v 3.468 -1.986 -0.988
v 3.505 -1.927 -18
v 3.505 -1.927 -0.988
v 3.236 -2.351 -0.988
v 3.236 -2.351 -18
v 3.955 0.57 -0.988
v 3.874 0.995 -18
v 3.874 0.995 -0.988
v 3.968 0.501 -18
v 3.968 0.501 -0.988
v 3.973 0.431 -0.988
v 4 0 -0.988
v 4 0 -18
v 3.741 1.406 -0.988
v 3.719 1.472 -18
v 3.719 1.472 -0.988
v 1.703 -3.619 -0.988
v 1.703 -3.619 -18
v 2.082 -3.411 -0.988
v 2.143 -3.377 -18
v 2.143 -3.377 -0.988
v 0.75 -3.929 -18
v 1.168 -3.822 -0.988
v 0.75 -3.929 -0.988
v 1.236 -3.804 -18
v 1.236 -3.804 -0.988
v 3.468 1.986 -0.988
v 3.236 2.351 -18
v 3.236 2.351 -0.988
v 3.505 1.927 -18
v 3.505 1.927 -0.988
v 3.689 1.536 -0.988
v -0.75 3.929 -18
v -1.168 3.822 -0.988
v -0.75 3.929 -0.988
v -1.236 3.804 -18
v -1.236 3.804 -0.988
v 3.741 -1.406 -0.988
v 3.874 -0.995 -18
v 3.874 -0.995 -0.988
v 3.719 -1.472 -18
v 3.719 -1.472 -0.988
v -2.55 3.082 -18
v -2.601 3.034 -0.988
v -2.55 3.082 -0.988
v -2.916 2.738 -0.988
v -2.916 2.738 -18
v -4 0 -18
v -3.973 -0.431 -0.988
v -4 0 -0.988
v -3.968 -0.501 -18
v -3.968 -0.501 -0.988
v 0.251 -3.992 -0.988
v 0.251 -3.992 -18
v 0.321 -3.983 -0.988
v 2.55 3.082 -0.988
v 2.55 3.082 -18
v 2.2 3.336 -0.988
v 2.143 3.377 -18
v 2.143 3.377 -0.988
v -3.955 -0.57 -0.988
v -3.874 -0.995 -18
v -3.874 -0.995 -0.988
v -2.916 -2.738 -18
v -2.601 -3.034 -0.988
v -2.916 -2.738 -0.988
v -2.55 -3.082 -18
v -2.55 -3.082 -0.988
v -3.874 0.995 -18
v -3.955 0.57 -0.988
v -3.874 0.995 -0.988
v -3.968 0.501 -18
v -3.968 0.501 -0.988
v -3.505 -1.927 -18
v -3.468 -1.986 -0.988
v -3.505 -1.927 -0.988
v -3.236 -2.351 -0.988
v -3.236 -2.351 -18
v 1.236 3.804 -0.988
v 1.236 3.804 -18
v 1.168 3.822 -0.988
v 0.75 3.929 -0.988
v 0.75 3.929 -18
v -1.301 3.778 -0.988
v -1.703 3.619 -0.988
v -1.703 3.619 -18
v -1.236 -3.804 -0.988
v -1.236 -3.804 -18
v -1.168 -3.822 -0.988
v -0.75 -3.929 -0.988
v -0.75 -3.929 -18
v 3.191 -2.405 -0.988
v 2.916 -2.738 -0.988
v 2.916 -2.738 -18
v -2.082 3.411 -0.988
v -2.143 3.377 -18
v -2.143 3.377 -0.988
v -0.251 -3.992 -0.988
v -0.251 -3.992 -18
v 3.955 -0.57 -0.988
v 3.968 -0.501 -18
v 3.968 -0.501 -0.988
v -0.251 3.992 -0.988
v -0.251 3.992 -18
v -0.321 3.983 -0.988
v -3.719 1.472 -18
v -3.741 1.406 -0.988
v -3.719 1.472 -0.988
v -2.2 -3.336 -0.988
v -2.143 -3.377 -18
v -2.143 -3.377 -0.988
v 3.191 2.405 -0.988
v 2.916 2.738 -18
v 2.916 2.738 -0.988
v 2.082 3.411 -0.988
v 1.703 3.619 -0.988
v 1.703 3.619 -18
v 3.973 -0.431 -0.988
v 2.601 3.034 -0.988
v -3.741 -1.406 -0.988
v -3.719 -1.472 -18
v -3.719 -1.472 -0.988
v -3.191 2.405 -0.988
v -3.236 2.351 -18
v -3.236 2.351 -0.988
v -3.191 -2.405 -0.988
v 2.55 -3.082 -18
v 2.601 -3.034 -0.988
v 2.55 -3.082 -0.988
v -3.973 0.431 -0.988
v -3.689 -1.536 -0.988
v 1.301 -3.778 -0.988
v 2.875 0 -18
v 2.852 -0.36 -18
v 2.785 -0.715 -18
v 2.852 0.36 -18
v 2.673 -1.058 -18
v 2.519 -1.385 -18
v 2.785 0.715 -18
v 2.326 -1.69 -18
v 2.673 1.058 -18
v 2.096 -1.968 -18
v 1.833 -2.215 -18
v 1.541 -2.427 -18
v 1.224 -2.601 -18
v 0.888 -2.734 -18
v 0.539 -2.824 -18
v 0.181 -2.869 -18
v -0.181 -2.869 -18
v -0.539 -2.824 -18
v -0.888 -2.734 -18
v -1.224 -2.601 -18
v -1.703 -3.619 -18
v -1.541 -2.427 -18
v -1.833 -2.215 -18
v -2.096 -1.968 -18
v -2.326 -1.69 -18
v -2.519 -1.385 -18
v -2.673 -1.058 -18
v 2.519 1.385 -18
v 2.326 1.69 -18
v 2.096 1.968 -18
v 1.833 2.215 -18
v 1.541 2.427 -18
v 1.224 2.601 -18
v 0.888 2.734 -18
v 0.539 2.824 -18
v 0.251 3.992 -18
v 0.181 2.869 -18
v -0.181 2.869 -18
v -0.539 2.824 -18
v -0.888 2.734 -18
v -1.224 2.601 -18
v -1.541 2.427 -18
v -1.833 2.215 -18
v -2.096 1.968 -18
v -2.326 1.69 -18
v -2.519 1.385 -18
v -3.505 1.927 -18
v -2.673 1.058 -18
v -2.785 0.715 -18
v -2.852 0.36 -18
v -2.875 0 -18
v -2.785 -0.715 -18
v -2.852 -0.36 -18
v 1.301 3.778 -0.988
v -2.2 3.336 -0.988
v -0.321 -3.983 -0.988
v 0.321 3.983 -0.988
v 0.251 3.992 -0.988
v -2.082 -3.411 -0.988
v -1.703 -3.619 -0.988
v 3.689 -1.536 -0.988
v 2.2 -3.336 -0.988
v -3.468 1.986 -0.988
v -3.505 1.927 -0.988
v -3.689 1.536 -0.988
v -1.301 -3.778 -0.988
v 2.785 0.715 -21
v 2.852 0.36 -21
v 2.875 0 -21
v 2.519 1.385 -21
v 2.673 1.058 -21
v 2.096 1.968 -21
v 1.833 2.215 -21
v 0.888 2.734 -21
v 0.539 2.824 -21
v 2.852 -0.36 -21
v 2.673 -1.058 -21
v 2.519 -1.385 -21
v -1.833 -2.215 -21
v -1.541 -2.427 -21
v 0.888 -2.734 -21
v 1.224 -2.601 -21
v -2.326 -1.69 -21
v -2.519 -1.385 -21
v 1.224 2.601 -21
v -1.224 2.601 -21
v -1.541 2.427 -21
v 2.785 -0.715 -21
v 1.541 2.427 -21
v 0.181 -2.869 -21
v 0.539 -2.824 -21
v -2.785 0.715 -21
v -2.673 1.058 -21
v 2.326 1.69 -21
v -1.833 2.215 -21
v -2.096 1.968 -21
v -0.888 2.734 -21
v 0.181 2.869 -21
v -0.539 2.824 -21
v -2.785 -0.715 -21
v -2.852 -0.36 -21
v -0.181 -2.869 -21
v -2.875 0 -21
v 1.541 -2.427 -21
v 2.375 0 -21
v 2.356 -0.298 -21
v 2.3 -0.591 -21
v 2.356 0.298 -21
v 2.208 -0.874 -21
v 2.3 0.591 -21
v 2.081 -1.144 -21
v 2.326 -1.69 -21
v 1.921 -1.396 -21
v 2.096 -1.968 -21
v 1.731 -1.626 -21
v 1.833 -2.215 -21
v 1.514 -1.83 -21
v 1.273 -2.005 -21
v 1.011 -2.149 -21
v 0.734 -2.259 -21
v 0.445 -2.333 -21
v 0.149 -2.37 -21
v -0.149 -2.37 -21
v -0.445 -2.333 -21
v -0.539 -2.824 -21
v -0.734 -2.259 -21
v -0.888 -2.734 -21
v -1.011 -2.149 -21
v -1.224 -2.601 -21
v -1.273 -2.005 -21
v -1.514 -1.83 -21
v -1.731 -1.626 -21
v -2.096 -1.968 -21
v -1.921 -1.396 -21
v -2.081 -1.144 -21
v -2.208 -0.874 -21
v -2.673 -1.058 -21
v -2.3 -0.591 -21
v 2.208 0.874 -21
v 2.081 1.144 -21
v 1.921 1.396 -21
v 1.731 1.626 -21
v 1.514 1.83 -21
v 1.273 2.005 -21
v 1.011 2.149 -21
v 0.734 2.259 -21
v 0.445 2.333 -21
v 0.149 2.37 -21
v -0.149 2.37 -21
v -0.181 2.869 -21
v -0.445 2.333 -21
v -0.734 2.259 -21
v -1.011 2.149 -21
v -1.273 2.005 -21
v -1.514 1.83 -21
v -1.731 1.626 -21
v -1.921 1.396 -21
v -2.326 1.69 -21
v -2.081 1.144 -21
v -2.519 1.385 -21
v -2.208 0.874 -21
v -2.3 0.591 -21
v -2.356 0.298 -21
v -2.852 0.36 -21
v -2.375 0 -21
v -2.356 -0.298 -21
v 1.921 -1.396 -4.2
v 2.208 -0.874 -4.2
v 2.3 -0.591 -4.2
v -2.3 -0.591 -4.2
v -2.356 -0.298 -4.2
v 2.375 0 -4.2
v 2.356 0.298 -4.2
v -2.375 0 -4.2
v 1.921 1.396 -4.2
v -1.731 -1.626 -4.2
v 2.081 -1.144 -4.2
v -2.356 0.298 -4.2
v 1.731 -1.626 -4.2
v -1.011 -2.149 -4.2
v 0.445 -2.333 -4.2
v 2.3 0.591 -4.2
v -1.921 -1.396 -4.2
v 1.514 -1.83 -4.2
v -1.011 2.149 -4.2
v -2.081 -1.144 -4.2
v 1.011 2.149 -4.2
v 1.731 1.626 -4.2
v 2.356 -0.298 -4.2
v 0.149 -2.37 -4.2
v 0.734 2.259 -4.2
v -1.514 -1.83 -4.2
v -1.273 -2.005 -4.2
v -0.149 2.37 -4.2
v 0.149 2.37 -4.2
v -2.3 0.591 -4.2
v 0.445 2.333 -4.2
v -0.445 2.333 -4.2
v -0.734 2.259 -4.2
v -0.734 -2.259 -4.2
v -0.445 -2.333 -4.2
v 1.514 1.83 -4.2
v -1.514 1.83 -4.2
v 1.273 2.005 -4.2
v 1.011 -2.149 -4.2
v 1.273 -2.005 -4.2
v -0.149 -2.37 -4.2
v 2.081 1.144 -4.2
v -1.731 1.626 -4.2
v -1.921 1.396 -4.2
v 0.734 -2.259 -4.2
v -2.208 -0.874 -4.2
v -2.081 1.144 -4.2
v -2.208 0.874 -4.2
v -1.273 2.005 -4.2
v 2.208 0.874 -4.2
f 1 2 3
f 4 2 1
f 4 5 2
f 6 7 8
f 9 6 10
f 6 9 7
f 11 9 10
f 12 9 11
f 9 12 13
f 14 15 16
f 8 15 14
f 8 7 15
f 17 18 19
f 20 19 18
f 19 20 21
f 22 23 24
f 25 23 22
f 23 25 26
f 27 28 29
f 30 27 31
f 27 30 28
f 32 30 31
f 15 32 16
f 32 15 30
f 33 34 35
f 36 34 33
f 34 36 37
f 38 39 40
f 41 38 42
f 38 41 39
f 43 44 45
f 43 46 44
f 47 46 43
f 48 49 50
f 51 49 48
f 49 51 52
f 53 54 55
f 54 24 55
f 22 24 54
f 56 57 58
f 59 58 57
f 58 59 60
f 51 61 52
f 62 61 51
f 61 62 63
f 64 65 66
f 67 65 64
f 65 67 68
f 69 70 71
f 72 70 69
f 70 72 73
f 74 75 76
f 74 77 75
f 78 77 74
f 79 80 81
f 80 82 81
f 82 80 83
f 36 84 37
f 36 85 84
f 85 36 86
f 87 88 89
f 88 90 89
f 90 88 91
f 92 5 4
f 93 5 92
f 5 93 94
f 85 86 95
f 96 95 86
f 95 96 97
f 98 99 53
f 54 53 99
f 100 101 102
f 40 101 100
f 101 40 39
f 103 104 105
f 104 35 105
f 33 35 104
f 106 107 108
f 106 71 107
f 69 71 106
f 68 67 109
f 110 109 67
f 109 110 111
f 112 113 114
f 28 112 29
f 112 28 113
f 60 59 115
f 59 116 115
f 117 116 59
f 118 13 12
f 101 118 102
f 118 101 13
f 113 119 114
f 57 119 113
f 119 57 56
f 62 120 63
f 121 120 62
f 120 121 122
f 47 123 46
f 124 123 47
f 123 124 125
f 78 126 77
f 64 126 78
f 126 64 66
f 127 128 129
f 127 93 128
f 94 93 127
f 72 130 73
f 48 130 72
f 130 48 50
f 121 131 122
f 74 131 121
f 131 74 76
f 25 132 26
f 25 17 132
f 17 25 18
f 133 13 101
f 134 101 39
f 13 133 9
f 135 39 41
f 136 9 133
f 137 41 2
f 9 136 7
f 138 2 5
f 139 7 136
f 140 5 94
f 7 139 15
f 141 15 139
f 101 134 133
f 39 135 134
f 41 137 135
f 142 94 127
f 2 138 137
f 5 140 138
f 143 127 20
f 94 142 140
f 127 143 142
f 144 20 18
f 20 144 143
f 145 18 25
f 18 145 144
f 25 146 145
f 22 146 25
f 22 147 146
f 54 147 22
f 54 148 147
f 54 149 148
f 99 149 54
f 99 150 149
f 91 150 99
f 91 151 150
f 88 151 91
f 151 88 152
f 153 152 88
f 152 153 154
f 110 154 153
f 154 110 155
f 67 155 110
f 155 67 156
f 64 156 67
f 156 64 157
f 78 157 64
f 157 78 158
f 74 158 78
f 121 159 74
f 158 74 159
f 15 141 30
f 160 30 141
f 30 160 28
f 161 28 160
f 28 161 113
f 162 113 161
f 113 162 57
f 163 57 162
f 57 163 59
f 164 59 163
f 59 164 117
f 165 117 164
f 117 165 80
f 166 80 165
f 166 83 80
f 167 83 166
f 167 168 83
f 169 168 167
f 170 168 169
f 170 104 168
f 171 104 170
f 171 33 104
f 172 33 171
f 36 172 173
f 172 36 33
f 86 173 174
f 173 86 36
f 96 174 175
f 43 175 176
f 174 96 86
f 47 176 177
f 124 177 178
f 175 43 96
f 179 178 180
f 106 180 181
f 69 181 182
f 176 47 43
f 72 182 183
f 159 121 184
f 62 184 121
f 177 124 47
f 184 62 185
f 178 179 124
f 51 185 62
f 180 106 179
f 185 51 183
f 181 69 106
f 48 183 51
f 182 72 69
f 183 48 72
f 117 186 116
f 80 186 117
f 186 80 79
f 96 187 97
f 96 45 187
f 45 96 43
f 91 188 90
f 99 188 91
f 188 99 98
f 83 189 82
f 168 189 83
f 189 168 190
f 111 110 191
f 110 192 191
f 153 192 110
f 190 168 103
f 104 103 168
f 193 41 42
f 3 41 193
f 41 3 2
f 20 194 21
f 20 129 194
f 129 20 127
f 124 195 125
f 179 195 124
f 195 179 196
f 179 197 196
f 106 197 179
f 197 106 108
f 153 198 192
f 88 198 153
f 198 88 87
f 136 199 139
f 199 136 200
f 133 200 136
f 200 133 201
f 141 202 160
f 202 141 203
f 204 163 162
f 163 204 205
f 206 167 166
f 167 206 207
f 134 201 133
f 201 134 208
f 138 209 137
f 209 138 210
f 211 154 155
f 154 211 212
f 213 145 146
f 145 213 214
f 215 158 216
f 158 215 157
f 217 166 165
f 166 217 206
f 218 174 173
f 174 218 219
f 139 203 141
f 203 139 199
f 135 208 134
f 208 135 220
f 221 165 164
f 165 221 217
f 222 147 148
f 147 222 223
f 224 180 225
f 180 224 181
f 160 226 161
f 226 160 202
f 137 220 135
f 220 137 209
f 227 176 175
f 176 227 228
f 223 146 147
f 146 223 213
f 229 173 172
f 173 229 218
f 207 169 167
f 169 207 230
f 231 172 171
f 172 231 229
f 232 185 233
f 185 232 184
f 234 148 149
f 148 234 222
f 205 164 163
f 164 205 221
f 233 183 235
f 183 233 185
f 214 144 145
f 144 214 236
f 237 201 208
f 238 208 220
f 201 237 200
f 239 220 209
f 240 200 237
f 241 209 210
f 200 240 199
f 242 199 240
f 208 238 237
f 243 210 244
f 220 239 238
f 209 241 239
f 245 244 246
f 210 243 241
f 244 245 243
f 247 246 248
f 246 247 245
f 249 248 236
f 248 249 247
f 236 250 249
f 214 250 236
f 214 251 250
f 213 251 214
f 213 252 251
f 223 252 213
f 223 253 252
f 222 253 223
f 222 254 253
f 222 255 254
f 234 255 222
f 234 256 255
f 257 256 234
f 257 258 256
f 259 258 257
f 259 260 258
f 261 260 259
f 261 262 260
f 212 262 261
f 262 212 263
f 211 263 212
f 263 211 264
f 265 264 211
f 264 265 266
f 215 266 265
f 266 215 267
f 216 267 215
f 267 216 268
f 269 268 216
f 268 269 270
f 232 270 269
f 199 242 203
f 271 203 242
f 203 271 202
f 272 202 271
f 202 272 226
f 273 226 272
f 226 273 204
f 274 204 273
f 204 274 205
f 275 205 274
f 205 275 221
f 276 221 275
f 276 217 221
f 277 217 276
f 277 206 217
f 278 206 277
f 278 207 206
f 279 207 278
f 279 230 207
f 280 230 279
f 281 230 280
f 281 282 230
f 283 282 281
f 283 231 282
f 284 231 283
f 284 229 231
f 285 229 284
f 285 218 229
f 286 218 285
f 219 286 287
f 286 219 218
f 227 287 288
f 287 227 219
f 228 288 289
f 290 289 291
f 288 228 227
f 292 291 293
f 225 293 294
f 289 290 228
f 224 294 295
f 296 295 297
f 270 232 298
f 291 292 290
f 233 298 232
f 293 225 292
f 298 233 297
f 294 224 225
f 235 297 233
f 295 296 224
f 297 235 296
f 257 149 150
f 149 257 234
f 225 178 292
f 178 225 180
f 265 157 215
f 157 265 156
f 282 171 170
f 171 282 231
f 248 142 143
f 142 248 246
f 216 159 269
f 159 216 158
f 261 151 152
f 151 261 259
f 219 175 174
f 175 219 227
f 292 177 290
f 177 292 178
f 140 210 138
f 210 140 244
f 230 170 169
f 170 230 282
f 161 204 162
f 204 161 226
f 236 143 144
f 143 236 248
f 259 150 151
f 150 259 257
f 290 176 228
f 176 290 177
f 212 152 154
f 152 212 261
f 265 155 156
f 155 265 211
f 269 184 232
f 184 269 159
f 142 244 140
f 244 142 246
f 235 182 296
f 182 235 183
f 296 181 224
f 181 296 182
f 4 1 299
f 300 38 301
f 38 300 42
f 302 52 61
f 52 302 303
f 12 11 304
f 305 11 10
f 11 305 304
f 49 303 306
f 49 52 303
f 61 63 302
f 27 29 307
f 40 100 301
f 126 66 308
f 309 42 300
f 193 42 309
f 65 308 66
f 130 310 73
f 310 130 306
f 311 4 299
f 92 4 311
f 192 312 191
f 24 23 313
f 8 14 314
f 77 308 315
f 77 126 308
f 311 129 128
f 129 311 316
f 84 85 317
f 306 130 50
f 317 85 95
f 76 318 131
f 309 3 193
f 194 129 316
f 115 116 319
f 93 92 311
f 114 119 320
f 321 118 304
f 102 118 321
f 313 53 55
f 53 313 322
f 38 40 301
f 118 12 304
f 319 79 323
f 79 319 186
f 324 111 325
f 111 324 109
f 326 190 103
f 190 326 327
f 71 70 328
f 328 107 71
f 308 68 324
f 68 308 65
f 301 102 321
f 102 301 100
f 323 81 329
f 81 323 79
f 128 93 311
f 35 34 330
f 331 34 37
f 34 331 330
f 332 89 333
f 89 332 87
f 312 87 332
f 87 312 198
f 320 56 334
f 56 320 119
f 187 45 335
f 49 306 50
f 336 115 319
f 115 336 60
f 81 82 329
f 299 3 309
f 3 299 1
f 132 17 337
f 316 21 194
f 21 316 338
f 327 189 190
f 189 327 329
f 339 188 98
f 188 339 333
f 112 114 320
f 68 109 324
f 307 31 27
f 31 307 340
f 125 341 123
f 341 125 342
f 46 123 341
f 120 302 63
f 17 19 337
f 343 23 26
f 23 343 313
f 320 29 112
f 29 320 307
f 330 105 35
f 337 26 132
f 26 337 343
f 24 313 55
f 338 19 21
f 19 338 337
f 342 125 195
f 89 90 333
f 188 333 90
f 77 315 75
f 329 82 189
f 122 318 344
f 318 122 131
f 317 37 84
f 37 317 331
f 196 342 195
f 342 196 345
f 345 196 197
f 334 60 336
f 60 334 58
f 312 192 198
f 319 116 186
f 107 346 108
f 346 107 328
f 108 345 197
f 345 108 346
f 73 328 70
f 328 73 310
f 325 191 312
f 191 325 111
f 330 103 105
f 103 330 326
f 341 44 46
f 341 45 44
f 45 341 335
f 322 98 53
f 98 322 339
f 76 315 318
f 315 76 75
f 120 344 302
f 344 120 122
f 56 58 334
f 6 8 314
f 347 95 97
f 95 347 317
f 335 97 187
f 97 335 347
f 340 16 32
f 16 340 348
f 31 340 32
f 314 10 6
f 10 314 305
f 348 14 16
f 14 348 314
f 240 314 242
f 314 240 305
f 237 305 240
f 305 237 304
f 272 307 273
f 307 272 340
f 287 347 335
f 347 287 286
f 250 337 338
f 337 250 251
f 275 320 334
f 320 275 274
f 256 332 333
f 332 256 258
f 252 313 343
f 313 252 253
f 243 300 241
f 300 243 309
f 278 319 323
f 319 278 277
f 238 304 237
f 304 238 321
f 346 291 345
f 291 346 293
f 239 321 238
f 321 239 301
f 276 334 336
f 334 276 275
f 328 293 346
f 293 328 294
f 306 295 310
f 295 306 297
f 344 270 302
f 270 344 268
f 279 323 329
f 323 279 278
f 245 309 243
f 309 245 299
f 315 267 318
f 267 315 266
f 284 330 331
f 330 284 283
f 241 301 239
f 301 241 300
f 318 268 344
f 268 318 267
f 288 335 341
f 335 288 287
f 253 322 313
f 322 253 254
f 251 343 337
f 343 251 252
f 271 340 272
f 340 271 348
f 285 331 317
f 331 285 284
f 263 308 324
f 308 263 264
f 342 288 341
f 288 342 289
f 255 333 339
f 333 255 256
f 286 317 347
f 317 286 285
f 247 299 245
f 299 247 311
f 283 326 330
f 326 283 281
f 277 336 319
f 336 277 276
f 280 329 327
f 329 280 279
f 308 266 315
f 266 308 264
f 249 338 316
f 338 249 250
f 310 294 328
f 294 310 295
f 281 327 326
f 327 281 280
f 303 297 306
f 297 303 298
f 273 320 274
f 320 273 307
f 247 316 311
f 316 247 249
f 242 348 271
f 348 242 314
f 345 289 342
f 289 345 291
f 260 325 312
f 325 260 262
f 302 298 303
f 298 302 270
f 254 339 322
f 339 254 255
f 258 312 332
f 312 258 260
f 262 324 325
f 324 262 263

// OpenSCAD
$fn = 50;

difference() {
	union() {
		translate(v = [0, 0, -18.0]) {
			cylinder(h = 21, r = 4.0);
		}
		#translate(v = [0, 0, -21.0]) {
			cylinder(h = 21, r = 2.875);
		}
	}
	union() {
		translate(v = [0, 0, 0]) {
			rotate(a = [0, 0, 0]) {
				difference() {
					union() {
						translate(v = [0, 0, -21.0]) {
							cylinder(h = 21, r = 2.25);
						}
						translate(v = [0, 0, -4.2]) {
							cylinder(h = 4.2, r1 = 2.375, r2 = 4.5);
						}
						translate(v = [0, 0, -21.0]) {
							cylinder(h = 21, r = 2.375);
						}
						translate(v = [0, 0, -21.0]) {
							cylinder(h = 21, r = 2.25);
						}
					}
					union();
				}
			}
		}
		#cylinder(h = 3, r = 5.0);
	}
}
